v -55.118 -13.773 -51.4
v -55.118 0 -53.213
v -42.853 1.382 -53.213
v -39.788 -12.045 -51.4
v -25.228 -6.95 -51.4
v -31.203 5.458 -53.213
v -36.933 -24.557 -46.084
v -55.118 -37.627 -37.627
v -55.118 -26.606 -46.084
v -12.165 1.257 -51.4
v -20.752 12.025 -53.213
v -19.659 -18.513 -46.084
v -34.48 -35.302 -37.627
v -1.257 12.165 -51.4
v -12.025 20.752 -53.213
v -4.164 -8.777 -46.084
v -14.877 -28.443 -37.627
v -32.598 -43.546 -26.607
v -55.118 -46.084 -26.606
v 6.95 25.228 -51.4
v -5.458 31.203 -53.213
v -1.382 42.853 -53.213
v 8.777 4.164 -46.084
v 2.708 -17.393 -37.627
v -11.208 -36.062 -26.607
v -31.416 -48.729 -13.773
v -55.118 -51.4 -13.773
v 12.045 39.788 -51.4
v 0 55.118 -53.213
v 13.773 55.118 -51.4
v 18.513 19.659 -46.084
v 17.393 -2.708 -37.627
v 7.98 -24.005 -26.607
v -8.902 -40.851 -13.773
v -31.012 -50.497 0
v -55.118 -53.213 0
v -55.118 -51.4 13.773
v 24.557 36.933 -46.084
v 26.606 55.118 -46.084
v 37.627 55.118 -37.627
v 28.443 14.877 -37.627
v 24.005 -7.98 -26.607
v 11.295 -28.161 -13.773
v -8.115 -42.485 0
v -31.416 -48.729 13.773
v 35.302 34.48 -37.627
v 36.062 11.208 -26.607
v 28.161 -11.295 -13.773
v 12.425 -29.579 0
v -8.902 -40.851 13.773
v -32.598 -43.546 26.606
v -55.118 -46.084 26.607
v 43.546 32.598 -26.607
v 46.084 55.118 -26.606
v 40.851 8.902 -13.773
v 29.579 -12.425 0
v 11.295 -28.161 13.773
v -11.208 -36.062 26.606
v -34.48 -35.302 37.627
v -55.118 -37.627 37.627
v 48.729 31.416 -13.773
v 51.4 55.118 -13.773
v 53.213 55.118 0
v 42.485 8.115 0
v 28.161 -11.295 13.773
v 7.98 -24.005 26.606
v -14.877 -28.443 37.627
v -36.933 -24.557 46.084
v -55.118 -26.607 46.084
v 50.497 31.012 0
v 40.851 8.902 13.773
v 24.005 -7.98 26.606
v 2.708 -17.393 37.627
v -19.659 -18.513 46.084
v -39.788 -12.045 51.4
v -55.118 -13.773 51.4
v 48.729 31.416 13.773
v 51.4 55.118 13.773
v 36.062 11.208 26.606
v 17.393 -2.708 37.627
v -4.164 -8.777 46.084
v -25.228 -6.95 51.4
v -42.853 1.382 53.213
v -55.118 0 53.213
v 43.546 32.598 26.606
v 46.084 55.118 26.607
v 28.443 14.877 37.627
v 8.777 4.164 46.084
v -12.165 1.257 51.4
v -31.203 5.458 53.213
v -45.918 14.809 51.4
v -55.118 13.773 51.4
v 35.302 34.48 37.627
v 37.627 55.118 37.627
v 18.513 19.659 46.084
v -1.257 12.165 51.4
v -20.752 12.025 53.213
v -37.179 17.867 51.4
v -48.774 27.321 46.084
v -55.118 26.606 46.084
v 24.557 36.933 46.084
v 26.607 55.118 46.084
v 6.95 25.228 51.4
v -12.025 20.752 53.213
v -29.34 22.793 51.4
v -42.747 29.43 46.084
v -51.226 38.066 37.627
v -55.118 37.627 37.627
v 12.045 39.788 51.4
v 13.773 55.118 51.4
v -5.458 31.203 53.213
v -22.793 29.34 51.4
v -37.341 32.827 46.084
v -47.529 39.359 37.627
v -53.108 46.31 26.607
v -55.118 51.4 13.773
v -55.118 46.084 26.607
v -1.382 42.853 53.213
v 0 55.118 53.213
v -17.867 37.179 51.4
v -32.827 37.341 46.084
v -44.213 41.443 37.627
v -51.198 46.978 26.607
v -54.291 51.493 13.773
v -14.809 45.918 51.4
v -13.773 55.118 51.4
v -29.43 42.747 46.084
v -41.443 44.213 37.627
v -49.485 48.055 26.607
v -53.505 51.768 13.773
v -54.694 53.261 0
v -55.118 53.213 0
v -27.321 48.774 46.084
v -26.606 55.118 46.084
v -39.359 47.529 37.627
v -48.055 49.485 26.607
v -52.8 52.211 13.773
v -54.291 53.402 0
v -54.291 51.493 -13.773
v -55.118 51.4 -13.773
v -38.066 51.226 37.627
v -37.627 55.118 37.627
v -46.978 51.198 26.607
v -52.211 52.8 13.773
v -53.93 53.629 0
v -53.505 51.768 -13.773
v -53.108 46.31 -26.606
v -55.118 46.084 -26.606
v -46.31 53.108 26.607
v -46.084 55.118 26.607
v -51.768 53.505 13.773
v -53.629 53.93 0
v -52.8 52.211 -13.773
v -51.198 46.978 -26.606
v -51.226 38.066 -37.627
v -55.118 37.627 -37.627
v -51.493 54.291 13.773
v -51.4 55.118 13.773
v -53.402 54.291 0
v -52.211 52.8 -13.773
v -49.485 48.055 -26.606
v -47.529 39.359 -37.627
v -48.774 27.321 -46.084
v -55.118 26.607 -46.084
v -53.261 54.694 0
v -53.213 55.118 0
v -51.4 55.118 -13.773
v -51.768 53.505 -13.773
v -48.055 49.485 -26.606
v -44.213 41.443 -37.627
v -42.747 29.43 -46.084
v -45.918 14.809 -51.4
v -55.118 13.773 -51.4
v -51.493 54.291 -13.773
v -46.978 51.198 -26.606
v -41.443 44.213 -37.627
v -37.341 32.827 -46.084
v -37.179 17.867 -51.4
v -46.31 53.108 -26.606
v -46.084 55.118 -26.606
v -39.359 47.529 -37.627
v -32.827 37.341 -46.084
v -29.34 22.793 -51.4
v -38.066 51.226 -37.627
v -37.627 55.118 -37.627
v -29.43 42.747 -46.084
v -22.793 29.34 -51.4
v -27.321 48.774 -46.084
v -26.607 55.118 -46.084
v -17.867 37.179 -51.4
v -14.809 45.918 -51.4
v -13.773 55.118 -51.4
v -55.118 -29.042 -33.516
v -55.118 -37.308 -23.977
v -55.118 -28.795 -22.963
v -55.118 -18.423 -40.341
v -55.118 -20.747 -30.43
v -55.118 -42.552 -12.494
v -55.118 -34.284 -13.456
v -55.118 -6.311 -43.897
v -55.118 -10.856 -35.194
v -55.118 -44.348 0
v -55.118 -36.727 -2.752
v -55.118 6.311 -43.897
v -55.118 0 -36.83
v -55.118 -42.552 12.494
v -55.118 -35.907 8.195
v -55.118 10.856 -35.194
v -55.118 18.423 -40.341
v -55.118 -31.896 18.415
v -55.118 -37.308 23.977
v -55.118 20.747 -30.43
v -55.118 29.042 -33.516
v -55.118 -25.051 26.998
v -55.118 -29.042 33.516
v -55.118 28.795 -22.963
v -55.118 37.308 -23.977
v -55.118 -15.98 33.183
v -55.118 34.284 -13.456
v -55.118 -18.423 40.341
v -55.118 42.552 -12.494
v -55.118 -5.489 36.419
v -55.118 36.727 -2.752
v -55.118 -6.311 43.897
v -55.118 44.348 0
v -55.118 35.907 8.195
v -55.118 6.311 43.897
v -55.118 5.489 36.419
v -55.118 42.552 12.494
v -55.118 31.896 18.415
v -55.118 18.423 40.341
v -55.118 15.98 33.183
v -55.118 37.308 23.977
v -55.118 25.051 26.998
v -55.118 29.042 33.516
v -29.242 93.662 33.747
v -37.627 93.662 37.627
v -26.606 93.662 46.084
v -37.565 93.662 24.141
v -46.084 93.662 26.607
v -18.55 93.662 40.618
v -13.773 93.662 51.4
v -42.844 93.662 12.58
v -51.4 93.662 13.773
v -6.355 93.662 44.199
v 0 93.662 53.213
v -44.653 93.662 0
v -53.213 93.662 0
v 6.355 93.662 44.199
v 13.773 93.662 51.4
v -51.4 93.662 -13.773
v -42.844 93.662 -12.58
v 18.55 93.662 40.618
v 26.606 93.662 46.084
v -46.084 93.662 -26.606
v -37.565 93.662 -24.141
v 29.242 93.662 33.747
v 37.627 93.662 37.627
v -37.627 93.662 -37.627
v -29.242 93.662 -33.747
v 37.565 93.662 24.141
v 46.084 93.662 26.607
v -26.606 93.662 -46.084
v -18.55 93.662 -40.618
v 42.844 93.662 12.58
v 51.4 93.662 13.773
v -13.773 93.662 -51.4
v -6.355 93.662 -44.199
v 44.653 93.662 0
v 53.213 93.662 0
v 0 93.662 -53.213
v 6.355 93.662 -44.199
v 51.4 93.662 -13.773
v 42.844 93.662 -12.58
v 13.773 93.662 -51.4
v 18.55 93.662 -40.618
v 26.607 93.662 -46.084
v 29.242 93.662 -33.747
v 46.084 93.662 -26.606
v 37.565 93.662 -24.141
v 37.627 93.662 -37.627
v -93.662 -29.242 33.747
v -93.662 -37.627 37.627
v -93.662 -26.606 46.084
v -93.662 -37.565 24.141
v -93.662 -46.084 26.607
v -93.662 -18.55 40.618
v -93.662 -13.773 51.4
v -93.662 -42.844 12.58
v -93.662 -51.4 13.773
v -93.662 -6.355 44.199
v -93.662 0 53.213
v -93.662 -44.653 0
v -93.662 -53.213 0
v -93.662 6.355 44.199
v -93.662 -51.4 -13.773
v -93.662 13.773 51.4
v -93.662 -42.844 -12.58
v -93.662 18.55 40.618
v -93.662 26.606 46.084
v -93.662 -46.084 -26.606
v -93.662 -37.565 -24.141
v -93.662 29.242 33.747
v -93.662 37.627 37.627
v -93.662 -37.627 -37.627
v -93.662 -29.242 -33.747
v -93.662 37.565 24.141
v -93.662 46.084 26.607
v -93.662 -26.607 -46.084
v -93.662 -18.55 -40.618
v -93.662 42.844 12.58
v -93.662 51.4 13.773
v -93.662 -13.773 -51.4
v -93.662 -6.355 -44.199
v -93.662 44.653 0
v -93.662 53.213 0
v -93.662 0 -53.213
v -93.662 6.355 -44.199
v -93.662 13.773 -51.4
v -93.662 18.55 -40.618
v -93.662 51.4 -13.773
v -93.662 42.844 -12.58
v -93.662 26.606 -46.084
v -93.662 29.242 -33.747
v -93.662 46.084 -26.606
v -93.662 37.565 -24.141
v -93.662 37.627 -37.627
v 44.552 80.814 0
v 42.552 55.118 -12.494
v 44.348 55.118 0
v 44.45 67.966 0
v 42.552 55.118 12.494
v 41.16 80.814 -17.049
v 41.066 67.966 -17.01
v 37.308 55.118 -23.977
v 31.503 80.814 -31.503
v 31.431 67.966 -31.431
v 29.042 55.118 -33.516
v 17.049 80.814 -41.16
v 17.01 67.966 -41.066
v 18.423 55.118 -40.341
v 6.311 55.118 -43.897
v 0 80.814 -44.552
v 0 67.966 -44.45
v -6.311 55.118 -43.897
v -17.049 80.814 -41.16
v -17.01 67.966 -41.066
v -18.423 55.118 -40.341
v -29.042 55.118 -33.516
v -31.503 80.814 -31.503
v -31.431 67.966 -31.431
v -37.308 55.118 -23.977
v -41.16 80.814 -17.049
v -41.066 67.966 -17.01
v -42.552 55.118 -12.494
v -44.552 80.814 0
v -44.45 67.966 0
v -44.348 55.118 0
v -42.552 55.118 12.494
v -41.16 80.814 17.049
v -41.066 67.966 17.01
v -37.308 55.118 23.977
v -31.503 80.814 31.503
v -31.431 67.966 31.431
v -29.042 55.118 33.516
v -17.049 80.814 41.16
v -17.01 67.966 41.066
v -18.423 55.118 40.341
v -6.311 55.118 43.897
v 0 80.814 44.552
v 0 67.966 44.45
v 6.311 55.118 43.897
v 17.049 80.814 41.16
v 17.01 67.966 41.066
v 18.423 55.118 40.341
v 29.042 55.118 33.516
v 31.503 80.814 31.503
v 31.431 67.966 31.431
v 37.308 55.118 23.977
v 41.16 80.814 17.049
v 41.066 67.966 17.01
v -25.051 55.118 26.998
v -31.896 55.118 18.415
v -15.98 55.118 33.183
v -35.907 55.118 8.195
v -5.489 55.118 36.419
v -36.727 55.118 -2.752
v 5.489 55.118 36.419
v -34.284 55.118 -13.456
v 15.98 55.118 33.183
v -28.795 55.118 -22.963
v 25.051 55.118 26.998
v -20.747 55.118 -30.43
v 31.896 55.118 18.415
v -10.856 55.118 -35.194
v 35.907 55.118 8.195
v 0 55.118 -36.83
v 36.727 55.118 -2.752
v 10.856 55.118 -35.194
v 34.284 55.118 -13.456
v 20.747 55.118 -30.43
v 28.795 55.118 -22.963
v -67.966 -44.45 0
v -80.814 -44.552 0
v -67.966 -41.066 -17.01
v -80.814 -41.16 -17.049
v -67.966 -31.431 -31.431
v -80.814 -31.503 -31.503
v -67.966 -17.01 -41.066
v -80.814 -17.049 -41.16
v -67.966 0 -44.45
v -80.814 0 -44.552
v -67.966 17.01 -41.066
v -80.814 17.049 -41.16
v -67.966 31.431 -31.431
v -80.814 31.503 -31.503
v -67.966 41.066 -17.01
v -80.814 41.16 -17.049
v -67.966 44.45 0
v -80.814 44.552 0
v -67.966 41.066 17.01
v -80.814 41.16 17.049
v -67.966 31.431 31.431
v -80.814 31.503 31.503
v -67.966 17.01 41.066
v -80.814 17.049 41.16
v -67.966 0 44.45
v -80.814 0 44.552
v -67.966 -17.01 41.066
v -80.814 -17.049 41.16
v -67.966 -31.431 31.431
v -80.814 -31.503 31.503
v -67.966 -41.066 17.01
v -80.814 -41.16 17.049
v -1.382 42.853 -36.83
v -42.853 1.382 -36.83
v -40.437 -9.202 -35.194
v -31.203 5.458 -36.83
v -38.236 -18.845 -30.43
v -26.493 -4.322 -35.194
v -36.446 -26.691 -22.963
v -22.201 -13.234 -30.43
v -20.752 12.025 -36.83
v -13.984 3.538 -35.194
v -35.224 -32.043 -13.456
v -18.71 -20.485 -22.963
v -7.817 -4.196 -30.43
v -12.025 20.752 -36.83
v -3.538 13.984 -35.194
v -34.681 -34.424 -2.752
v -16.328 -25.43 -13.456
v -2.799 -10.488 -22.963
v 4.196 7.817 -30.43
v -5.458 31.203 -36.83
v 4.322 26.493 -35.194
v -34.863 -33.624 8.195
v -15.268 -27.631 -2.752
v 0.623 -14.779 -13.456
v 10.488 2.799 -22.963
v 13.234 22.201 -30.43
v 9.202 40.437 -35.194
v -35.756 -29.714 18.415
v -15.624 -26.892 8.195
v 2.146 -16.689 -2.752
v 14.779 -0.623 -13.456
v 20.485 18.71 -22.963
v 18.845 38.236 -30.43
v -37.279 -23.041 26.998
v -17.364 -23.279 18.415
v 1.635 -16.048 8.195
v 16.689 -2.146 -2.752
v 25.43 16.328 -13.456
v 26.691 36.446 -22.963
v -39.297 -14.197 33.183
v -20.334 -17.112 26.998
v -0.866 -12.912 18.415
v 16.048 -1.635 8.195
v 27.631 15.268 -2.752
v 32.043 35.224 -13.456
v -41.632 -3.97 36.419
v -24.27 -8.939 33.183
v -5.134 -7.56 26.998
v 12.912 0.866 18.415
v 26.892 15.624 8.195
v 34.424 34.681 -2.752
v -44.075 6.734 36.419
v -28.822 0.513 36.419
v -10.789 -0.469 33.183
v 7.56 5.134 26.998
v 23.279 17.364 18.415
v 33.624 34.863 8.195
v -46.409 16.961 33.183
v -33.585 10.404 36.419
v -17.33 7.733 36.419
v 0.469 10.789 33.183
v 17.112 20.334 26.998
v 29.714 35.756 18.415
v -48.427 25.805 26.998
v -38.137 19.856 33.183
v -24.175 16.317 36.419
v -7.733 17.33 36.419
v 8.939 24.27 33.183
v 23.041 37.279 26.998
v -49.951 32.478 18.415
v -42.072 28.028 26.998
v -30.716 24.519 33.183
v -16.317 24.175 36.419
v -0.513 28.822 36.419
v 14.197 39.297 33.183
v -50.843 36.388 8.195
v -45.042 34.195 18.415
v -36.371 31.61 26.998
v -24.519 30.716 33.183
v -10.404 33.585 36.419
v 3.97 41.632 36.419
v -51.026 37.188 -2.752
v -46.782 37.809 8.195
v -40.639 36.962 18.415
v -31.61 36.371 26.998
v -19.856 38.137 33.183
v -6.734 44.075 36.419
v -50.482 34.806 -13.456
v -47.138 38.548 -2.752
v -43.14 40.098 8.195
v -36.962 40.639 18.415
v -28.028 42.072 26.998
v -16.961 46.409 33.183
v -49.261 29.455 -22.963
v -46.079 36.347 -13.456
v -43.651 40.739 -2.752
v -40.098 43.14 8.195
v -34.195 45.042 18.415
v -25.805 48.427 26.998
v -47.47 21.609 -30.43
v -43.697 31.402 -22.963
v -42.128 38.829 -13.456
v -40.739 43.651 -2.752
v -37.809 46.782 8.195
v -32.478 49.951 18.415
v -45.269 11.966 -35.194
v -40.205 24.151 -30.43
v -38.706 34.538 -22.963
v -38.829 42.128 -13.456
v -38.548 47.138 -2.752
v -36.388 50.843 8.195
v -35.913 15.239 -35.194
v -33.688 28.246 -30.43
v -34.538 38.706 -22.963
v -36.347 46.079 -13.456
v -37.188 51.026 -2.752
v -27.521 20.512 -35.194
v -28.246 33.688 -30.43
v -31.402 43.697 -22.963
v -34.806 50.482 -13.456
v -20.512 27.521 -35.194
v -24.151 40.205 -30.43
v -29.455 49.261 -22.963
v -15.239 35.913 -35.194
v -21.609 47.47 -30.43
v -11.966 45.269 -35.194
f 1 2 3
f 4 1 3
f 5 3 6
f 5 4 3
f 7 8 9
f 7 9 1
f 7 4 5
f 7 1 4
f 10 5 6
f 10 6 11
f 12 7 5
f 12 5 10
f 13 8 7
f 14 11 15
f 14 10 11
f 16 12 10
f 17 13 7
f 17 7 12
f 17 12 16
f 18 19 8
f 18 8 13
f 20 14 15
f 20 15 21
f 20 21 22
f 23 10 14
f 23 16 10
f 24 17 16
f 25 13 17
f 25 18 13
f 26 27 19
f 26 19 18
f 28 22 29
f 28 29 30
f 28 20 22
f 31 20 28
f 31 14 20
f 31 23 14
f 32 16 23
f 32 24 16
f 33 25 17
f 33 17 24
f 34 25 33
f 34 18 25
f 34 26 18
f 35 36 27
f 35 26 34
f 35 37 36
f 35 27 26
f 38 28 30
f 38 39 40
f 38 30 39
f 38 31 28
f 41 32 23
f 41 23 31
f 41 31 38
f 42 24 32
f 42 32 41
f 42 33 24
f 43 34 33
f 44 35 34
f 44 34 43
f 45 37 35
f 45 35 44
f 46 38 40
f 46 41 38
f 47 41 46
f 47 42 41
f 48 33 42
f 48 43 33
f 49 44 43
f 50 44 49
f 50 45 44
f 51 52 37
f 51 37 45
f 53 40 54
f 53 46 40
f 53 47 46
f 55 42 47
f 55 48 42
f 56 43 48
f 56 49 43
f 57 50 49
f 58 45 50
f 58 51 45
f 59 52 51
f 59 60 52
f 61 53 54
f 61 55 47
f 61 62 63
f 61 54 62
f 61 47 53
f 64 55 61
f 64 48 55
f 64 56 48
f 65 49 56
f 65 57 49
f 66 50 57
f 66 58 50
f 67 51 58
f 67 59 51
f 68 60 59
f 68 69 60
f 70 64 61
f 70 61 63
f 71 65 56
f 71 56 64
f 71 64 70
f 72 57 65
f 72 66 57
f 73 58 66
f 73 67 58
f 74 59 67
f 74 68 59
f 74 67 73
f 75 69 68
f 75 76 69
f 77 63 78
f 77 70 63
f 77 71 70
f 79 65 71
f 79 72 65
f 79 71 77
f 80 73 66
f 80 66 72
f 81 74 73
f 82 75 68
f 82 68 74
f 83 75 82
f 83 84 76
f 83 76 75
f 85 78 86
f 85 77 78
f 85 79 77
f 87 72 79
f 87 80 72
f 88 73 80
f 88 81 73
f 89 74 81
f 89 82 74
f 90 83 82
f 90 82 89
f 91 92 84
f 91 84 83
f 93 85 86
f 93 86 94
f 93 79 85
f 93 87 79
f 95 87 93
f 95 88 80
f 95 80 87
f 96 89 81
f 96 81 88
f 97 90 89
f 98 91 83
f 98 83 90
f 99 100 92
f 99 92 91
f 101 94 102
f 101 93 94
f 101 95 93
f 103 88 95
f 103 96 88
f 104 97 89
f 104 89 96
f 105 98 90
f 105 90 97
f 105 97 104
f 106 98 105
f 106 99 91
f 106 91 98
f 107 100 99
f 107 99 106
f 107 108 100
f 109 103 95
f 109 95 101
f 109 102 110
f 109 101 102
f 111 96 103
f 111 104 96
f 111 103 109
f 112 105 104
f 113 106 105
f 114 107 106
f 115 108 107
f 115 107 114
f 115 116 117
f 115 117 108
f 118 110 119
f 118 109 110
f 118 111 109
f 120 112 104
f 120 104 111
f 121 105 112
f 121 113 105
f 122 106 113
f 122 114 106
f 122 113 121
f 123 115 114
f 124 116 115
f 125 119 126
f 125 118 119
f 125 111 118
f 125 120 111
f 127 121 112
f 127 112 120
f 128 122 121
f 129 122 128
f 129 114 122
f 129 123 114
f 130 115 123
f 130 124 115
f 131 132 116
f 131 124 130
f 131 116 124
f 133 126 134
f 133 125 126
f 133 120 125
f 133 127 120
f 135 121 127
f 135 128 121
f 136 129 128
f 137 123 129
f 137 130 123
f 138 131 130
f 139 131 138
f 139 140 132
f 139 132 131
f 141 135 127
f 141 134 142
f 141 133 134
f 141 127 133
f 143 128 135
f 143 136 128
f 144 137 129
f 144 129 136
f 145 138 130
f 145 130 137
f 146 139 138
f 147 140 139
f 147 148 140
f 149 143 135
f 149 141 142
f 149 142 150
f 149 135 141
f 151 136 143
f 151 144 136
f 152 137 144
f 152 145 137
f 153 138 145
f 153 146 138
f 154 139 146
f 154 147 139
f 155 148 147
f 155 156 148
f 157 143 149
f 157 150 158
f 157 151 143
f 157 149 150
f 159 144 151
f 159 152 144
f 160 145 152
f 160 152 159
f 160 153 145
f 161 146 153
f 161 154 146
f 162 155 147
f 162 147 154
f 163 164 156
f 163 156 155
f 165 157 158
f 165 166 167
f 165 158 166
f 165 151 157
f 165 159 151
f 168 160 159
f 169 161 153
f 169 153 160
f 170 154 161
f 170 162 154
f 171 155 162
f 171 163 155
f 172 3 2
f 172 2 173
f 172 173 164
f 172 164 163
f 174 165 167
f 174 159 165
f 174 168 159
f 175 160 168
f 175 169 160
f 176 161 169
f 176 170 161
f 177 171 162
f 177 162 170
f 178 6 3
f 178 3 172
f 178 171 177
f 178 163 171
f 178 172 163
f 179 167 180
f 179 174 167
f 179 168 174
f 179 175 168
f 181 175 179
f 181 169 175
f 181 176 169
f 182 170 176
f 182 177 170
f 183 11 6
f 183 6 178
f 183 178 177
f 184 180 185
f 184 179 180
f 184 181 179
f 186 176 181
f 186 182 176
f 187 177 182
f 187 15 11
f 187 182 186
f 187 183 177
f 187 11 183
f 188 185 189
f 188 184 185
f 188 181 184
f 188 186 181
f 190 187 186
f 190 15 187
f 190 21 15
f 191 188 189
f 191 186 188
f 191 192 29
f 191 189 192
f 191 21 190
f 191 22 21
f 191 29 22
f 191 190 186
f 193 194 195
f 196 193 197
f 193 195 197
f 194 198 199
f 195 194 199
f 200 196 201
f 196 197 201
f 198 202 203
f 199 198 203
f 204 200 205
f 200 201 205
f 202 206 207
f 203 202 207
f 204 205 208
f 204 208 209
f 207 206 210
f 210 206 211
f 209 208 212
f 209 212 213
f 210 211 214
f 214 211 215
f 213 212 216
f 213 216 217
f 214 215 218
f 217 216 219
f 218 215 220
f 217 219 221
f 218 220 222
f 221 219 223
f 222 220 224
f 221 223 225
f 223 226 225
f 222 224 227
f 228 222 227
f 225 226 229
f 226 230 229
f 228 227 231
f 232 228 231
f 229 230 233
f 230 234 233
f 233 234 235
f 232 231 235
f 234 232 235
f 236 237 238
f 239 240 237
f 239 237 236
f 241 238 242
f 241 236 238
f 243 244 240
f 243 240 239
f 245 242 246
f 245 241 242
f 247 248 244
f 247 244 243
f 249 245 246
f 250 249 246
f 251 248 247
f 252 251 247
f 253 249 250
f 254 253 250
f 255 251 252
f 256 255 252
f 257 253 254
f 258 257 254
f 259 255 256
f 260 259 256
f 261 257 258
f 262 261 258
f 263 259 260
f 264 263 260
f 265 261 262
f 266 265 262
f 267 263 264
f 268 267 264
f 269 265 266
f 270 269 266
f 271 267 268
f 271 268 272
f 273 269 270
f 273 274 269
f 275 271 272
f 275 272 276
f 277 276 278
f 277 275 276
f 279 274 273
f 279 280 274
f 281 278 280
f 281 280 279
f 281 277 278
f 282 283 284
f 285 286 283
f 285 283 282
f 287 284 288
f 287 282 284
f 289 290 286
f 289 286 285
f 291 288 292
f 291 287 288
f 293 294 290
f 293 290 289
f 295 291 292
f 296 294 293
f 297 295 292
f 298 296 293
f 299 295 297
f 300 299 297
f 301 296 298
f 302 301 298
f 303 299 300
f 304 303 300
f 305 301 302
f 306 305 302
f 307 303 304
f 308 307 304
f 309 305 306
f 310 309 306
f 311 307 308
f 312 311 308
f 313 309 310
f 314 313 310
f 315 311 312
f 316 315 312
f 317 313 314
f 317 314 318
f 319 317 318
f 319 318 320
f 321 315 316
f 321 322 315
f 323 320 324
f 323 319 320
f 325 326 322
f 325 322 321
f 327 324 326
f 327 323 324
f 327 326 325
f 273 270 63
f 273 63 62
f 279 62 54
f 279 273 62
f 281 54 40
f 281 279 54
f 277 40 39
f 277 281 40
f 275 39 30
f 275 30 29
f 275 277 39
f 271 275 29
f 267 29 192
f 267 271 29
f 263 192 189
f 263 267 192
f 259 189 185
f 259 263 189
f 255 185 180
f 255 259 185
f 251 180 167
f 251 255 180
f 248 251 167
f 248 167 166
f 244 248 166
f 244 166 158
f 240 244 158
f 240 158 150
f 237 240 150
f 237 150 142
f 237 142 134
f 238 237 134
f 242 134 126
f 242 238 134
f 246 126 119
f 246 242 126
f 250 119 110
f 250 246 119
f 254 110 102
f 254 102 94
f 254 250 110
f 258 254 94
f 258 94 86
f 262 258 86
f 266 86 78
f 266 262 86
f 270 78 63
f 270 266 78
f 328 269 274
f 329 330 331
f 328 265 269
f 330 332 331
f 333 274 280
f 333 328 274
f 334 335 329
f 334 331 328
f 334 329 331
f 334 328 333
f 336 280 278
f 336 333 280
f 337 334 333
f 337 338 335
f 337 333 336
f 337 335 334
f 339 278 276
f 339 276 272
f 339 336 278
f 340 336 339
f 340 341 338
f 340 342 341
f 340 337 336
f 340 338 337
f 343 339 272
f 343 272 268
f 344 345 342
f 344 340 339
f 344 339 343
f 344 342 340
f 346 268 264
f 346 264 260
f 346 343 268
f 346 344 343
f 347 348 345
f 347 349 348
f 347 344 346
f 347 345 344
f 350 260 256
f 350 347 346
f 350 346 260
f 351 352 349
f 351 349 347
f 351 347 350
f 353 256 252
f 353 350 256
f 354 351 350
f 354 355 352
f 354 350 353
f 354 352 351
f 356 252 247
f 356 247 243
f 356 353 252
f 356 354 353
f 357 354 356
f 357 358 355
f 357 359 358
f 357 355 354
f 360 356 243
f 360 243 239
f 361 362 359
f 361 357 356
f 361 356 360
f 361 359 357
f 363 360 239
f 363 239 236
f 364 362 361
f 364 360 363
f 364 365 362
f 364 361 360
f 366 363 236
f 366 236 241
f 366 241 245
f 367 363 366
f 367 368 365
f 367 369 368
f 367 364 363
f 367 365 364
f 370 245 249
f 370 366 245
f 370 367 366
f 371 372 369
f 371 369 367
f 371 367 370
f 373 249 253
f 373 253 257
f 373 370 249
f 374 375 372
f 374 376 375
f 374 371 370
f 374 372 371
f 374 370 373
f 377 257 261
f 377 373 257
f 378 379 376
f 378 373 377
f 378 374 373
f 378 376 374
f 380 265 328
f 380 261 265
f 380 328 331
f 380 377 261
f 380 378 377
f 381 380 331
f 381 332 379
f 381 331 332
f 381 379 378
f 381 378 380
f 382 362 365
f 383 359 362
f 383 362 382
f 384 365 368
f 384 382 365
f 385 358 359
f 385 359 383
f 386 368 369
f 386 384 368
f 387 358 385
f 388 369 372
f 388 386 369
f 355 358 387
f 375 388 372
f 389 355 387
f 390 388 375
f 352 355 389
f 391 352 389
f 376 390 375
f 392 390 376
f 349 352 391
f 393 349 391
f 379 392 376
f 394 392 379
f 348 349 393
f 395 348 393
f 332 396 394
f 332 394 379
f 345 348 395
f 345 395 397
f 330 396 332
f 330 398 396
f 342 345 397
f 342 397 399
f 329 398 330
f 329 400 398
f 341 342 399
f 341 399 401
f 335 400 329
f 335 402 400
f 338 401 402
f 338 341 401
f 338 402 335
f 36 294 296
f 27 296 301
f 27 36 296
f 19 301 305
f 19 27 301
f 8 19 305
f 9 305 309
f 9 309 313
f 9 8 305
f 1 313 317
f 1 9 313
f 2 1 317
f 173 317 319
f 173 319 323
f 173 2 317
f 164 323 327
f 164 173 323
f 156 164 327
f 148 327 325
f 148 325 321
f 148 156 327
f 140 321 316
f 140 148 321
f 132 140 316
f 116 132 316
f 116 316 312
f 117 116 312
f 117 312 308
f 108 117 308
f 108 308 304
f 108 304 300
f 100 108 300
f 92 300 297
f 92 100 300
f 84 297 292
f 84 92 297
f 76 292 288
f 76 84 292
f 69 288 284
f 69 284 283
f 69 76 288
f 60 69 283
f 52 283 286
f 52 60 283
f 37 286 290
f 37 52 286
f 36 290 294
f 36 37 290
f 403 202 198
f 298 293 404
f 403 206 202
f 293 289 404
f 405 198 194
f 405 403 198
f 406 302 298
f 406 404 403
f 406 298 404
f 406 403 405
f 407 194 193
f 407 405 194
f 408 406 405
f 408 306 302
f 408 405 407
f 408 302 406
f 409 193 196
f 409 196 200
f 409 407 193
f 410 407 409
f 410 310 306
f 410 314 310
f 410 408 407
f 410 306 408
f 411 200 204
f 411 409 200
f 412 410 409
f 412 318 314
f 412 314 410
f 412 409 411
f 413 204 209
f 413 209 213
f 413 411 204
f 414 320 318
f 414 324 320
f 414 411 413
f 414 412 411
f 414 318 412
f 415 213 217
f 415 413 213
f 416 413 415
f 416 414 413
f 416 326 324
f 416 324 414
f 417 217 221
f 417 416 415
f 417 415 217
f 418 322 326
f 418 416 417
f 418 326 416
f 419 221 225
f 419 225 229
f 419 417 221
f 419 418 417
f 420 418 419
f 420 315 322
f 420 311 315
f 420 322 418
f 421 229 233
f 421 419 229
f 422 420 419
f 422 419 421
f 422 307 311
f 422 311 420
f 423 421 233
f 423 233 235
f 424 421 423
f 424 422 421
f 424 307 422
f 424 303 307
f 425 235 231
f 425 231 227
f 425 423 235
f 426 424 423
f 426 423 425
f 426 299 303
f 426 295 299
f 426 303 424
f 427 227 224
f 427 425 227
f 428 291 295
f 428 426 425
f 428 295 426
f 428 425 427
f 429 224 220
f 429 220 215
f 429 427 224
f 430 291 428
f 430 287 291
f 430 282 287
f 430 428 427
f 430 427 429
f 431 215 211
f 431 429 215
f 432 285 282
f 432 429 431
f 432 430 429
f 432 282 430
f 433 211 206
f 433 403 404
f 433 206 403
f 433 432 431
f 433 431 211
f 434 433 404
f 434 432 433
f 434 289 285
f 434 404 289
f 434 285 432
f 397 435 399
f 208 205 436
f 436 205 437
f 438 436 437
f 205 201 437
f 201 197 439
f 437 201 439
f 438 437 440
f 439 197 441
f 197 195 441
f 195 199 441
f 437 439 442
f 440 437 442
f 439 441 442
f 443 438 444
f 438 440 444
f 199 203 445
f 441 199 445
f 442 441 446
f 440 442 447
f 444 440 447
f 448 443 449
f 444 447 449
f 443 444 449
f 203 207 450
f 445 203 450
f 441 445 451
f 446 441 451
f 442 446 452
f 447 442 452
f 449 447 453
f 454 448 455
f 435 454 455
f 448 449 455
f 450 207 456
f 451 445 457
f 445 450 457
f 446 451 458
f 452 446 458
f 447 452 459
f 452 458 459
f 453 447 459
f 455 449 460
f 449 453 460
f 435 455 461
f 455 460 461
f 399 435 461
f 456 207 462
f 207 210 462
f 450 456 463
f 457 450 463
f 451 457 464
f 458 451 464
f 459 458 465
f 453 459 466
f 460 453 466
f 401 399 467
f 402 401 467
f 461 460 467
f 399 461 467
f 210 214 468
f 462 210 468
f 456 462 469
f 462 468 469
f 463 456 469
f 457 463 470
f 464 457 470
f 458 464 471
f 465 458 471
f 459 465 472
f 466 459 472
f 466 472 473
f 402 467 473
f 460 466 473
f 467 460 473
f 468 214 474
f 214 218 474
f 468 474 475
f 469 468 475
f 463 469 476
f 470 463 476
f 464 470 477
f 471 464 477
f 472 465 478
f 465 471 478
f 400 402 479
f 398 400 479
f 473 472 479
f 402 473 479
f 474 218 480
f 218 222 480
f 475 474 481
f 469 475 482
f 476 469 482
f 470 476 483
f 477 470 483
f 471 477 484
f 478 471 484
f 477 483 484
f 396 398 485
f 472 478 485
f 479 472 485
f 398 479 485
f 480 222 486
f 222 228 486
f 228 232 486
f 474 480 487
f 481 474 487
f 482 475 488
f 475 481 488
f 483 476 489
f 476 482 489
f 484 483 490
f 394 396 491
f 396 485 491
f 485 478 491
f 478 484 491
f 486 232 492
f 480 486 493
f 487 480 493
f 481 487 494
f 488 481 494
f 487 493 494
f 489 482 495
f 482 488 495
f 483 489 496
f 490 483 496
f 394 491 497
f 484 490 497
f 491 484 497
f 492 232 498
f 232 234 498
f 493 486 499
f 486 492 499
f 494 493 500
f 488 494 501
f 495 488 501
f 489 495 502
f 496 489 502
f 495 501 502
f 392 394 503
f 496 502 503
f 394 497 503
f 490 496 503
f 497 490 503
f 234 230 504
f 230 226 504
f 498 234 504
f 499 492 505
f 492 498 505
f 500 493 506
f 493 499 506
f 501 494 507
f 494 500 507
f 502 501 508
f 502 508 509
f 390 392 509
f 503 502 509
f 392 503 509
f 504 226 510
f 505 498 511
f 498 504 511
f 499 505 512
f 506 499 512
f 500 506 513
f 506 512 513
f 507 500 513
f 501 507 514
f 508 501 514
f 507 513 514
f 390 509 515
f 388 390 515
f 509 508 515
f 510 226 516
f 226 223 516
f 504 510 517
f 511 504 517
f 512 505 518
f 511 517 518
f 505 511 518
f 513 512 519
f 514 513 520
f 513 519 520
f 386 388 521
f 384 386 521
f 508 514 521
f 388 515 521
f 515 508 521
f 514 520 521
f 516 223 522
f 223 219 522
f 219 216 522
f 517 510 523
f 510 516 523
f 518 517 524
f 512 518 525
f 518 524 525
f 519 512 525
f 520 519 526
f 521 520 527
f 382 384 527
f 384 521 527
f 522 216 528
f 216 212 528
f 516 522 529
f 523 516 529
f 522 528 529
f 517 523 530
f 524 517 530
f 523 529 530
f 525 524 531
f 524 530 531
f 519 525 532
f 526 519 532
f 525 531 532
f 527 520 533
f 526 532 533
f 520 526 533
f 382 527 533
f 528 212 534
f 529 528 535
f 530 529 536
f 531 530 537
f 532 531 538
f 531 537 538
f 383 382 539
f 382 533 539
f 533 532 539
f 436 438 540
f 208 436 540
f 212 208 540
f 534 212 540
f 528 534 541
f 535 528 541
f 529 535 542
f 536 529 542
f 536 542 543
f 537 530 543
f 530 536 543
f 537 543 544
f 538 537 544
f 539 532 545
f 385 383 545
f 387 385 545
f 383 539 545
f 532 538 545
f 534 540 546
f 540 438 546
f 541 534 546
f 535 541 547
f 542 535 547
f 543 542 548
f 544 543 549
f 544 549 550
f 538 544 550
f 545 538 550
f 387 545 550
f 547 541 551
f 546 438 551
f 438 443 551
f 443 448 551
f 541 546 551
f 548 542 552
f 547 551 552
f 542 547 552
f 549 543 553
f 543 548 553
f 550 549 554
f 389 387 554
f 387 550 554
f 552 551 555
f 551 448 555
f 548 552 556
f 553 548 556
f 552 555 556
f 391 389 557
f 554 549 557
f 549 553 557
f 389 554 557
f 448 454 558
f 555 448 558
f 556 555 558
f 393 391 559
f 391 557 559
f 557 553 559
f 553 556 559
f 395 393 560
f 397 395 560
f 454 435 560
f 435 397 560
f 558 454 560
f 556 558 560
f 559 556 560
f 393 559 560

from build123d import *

# Parameters (mm, degrees)
SKETCH3_R   = 53.213
SKETCH3_R_2 = 36.83


with BuildPart() as part:
    # Sketch1 → Revolve1 (revolve)
    with BuildSketch(Plane.XY):
        Polygon((-93.6625, -53.213), (-55.118, -53.213), (-55.118, -44.3484), (-93.6625, -44.6532), align=None)
    revolve(axis=Axis((-93.6625, 0, 0), (1, 0, 0)))



with BuildPart() as body_2:
    # Sketch2 → Revolve2 (revolve)
    with BuildSketch(Plane.XY):
        Polygon((44.6532, 93.6625), (44.3484, 55.118), (53.213, 55.118), (53.213, 93.6625), align=None)
    revolve(axis=Axis((0, 0, 0), (0, 1, 0)))


with BuildPart() as part_1:
    add(part.part)

    add(body_2.part)  # Sweep1 merges body 2
    # Sweep1: sweep along a path in Sketch4
    with BuildLine(Plane.XY) as sweep1_path:
        ThreePointArc((-55.118, 0), (-16.143688435, 16.143688435), (0, 55.118))
    # Sketch3 → Sweep1 (sweep)
    with BuildSketch(Plane(origin=(-55.118, 0, 0), x_dir=(0, 0, -1), z_dir=(1, 0, 0))):
        Circle(SKETCH3_R)
        Circle(SKETCH3_R_2, mode=Mode.SUBTRACT)
    sweep(path=sweep1_path.line)


solid = part_1.part
